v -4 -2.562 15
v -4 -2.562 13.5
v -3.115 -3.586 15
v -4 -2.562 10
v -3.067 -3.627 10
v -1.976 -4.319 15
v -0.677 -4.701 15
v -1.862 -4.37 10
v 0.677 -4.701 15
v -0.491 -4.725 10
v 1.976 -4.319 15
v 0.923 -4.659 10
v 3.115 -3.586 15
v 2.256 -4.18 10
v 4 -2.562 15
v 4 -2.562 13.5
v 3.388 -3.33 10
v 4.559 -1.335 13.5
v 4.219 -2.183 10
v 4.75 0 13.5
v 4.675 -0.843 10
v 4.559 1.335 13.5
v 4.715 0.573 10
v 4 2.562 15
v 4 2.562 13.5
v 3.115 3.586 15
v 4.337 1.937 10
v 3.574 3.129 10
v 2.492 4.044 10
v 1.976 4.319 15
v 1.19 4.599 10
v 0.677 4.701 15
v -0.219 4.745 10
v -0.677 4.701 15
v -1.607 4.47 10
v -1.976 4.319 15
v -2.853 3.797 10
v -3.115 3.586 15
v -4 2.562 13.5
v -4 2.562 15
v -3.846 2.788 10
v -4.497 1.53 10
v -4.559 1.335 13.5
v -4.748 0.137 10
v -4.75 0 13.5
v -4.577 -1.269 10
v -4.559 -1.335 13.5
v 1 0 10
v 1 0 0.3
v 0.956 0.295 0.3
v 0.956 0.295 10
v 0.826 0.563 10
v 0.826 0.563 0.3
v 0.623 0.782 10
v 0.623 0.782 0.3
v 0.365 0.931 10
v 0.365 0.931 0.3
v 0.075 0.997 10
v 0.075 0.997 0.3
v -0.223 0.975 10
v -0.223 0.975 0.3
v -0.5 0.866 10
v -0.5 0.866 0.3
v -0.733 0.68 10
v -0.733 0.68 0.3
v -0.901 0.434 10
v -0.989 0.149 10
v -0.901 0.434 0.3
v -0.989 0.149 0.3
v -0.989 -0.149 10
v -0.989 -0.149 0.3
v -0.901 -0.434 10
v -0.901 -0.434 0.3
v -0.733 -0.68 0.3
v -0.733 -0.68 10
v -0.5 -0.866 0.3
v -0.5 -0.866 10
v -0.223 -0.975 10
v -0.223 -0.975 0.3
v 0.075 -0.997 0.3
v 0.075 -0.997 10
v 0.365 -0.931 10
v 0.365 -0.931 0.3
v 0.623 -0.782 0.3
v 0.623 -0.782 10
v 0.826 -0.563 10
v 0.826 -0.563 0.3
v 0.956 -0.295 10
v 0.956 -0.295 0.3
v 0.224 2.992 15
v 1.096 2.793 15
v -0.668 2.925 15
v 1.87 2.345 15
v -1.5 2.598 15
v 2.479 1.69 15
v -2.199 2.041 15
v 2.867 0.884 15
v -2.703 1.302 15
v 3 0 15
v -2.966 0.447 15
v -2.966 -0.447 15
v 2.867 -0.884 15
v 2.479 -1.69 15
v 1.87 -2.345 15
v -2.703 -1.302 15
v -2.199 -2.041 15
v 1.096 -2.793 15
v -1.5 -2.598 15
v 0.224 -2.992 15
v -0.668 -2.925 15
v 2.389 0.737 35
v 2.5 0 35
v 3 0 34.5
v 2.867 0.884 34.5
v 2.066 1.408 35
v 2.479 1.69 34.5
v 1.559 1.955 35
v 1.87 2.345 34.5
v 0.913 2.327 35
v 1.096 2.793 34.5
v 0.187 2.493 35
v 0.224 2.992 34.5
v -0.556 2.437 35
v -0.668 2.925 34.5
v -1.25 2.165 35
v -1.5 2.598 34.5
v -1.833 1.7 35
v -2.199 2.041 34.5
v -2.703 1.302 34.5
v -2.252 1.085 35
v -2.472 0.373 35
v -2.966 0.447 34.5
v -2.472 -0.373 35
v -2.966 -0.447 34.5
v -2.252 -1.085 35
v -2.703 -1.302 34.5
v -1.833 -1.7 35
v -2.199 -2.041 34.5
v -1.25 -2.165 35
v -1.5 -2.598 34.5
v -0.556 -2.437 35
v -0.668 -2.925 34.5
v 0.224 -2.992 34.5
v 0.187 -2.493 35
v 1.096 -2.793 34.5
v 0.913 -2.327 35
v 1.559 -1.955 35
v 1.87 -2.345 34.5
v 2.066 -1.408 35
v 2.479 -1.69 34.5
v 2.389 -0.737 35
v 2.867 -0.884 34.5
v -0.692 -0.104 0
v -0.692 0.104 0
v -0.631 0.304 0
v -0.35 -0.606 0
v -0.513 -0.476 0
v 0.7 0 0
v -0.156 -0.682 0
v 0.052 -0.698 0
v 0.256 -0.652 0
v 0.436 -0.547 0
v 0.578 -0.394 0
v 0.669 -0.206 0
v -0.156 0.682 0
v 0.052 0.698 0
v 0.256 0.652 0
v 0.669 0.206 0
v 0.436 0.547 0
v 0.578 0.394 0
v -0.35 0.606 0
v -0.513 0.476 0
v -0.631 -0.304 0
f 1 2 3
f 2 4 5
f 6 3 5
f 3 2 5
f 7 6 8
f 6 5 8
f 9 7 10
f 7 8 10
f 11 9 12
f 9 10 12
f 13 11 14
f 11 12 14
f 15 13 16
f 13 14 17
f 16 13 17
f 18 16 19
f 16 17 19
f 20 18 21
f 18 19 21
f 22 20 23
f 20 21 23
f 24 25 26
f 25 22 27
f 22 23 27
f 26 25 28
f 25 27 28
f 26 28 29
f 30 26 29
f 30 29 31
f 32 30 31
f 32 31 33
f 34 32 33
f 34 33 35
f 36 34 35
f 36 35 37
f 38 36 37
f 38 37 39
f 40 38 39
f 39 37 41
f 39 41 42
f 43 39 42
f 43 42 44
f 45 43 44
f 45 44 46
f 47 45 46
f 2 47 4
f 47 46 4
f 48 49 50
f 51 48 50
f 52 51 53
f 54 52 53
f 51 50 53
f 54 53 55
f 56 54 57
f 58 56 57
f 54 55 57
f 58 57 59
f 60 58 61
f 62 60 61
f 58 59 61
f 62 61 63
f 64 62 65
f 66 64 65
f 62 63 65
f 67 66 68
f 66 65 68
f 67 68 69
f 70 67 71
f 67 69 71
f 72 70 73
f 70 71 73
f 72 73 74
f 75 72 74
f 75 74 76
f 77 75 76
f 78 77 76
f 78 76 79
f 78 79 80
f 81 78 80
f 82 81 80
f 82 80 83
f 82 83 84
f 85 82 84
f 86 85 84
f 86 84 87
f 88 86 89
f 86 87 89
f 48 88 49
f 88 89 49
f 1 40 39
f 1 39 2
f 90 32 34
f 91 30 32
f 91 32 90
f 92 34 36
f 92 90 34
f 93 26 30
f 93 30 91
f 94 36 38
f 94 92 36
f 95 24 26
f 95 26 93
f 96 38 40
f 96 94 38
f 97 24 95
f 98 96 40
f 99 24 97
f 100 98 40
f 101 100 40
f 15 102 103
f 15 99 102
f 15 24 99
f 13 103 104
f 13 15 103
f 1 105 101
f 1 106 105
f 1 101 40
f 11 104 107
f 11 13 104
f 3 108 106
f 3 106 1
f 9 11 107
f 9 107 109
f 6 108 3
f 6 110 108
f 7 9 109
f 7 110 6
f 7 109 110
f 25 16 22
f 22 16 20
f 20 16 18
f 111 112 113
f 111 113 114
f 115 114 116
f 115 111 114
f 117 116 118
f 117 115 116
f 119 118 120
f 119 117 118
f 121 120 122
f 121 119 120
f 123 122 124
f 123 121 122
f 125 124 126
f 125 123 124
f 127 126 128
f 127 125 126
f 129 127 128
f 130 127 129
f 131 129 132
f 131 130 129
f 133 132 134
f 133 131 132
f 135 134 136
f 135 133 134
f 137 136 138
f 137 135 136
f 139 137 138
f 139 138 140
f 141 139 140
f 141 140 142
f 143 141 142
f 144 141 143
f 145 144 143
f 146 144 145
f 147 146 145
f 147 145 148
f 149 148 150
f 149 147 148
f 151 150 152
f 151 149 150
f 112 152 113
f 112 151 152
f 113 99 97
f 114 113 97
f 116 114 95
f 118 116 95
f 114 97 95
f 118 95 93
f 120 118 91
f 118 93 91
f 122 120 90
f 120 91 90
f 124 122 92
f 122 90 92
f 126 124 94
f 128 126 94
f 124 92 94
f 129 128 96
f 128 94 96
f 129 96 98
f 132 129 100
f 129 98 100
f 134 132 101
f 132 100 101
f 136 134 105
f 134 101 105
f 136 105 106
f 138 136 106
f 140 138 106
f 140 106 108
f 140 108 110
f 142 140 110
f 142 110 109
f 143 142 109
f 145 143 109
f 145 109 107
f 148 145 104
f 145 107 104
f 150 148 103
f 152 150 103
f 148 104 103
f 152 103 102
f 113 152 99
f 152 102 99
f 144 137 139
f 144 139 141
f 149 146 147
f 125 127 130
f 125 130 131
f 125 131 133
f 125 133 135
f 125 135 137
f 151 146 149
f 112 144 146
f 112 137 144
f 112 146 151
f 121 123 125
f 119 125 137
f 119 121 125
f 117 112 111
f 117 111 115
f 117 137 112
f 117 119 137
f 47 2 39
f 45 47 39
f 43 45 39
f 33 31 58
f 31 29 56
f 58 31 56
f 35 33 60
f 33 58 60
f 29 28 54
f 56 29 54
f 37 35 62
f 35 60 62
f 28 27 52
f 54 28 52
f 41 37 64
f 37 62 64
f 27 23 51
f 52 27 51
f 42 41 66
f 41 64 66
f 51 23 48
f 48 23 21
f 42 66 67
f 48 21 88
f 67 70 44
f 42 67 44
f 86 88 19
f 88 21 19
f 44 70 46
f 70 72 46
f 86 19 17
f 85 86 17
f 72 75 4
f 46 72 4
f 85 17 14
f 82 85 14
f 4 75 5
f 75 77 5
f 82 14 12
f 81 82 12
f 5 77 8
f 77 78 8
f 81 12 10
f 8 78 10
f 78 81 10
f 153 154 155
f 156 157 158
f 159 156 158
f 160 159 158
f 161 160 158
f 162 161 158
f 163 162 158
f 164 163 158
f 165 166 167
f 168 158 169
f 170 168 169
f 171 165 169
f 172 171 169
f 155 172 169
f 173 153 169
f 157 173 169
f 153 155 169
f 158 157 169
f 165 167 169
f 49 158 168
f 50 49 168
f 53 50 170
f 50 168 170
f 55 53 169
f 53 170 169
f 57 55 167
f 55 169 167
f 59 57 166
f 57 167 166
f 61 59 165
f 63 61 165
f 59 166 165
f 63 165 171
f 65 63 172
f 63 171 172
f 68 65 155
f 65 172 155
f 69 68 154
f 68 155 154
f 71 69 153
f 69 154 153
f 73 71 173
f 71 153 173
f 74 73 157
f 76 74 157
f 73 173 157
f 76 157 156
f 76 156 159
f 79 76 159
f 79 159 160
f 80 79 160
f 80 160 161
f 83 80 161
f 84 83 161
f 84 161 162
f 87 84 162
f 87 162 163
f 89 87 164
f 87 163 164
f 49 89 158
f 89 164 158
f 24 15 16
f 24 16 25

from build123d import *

# Parameters (mm, degrees)
SKETCH_1_R          = 1
EXTRUDE_1_DEPTH     = 10
SKETCH_2_R          = 4.75
EXTRUDE_2_DEPTH     = 5
CUT_EXTRUDE_1_DEPTH = 1.5
SKETCH_4_W          = 2.580322654
SKETCH_4_H          = 8.195778588
CUT_EXTRUDE_3_DEPTH = 1.5
SKETCH_5_R          = 3
EXTRUDE_3_DEPTH     = 20
CHAMFER_1_SIZE      = 0.5
CHAMFER_2_SIZE      = 0.3


with BuildPart() as part:
    # Эскиз1 → Вытянуть1 (new body)
    with BuildSketch(Plane.XY):
        Circle(SKETCH_1_R)
    extrude(amount=EXTRUDE_1_DEPTH)

    # Эскиз2 → Вытянуть2 (add)
    with BuildSketch(Plane.XY.offset(10)):
        with Locations(Location((0, 0, 0), (0, 0, 212.636897504))):
            Circle(SKETCH_2_R)
    extrude(amount=EXTRUDE_2_DEPTH)

    # Эскиз3 → Вырез-Вытянуть1 (cut)
    with BuildSketch(Plane.XY.offset(15)):
        with BuildLine():
            Line((-4, 3.641620684), (-4, -3.641620684))
            ThreePointArc((-4, -3.641620684), (-5.409380852, 0), (-4, 3.641620684))
        make_face()
    extrude(amount=-CUT_EXTRUDE_1_DEPTH, mode=Mode.SUBTRACT)

    # Эскиз4 → Вырез-Вытянуть3 (cut)
    with BuildSketch(Plane.XY.offset(15)):
        with Locations((5.290161327, 0.120888876)):
            Rectangle(SKETCH_4_W, SKETCH_4_H)
    extrude(amount=-CUT_EXTRUDE_3_DEPTH, mode=Mode.SUBTRACT)

    # Эскиз5 → Вытянуть3 (add)
    with BuildSketch(Plane.XY.offset(15)):
        Circle(SKETCH_5_R)
    extrude(amount=EXTRUDE_3_DEPTH)

    # Фаска1
    chamfer_1_edges = [part.edges().sort_by_distance(p)[0] for p in [
        (-3, 0, 35),
    ]]
    chamfer(chamfer_1_edges, length=CHAMFER_1_SIZE)

    # Фаска2
    chamfer_2_edges = [part.edges().sort_by_distance(p)[0] for p in [
        (-1, 0, 0),
    ]]
    chamfer(chamfer_2_edges, length=CHAMFER_2_SIZE)


solid = part.part
